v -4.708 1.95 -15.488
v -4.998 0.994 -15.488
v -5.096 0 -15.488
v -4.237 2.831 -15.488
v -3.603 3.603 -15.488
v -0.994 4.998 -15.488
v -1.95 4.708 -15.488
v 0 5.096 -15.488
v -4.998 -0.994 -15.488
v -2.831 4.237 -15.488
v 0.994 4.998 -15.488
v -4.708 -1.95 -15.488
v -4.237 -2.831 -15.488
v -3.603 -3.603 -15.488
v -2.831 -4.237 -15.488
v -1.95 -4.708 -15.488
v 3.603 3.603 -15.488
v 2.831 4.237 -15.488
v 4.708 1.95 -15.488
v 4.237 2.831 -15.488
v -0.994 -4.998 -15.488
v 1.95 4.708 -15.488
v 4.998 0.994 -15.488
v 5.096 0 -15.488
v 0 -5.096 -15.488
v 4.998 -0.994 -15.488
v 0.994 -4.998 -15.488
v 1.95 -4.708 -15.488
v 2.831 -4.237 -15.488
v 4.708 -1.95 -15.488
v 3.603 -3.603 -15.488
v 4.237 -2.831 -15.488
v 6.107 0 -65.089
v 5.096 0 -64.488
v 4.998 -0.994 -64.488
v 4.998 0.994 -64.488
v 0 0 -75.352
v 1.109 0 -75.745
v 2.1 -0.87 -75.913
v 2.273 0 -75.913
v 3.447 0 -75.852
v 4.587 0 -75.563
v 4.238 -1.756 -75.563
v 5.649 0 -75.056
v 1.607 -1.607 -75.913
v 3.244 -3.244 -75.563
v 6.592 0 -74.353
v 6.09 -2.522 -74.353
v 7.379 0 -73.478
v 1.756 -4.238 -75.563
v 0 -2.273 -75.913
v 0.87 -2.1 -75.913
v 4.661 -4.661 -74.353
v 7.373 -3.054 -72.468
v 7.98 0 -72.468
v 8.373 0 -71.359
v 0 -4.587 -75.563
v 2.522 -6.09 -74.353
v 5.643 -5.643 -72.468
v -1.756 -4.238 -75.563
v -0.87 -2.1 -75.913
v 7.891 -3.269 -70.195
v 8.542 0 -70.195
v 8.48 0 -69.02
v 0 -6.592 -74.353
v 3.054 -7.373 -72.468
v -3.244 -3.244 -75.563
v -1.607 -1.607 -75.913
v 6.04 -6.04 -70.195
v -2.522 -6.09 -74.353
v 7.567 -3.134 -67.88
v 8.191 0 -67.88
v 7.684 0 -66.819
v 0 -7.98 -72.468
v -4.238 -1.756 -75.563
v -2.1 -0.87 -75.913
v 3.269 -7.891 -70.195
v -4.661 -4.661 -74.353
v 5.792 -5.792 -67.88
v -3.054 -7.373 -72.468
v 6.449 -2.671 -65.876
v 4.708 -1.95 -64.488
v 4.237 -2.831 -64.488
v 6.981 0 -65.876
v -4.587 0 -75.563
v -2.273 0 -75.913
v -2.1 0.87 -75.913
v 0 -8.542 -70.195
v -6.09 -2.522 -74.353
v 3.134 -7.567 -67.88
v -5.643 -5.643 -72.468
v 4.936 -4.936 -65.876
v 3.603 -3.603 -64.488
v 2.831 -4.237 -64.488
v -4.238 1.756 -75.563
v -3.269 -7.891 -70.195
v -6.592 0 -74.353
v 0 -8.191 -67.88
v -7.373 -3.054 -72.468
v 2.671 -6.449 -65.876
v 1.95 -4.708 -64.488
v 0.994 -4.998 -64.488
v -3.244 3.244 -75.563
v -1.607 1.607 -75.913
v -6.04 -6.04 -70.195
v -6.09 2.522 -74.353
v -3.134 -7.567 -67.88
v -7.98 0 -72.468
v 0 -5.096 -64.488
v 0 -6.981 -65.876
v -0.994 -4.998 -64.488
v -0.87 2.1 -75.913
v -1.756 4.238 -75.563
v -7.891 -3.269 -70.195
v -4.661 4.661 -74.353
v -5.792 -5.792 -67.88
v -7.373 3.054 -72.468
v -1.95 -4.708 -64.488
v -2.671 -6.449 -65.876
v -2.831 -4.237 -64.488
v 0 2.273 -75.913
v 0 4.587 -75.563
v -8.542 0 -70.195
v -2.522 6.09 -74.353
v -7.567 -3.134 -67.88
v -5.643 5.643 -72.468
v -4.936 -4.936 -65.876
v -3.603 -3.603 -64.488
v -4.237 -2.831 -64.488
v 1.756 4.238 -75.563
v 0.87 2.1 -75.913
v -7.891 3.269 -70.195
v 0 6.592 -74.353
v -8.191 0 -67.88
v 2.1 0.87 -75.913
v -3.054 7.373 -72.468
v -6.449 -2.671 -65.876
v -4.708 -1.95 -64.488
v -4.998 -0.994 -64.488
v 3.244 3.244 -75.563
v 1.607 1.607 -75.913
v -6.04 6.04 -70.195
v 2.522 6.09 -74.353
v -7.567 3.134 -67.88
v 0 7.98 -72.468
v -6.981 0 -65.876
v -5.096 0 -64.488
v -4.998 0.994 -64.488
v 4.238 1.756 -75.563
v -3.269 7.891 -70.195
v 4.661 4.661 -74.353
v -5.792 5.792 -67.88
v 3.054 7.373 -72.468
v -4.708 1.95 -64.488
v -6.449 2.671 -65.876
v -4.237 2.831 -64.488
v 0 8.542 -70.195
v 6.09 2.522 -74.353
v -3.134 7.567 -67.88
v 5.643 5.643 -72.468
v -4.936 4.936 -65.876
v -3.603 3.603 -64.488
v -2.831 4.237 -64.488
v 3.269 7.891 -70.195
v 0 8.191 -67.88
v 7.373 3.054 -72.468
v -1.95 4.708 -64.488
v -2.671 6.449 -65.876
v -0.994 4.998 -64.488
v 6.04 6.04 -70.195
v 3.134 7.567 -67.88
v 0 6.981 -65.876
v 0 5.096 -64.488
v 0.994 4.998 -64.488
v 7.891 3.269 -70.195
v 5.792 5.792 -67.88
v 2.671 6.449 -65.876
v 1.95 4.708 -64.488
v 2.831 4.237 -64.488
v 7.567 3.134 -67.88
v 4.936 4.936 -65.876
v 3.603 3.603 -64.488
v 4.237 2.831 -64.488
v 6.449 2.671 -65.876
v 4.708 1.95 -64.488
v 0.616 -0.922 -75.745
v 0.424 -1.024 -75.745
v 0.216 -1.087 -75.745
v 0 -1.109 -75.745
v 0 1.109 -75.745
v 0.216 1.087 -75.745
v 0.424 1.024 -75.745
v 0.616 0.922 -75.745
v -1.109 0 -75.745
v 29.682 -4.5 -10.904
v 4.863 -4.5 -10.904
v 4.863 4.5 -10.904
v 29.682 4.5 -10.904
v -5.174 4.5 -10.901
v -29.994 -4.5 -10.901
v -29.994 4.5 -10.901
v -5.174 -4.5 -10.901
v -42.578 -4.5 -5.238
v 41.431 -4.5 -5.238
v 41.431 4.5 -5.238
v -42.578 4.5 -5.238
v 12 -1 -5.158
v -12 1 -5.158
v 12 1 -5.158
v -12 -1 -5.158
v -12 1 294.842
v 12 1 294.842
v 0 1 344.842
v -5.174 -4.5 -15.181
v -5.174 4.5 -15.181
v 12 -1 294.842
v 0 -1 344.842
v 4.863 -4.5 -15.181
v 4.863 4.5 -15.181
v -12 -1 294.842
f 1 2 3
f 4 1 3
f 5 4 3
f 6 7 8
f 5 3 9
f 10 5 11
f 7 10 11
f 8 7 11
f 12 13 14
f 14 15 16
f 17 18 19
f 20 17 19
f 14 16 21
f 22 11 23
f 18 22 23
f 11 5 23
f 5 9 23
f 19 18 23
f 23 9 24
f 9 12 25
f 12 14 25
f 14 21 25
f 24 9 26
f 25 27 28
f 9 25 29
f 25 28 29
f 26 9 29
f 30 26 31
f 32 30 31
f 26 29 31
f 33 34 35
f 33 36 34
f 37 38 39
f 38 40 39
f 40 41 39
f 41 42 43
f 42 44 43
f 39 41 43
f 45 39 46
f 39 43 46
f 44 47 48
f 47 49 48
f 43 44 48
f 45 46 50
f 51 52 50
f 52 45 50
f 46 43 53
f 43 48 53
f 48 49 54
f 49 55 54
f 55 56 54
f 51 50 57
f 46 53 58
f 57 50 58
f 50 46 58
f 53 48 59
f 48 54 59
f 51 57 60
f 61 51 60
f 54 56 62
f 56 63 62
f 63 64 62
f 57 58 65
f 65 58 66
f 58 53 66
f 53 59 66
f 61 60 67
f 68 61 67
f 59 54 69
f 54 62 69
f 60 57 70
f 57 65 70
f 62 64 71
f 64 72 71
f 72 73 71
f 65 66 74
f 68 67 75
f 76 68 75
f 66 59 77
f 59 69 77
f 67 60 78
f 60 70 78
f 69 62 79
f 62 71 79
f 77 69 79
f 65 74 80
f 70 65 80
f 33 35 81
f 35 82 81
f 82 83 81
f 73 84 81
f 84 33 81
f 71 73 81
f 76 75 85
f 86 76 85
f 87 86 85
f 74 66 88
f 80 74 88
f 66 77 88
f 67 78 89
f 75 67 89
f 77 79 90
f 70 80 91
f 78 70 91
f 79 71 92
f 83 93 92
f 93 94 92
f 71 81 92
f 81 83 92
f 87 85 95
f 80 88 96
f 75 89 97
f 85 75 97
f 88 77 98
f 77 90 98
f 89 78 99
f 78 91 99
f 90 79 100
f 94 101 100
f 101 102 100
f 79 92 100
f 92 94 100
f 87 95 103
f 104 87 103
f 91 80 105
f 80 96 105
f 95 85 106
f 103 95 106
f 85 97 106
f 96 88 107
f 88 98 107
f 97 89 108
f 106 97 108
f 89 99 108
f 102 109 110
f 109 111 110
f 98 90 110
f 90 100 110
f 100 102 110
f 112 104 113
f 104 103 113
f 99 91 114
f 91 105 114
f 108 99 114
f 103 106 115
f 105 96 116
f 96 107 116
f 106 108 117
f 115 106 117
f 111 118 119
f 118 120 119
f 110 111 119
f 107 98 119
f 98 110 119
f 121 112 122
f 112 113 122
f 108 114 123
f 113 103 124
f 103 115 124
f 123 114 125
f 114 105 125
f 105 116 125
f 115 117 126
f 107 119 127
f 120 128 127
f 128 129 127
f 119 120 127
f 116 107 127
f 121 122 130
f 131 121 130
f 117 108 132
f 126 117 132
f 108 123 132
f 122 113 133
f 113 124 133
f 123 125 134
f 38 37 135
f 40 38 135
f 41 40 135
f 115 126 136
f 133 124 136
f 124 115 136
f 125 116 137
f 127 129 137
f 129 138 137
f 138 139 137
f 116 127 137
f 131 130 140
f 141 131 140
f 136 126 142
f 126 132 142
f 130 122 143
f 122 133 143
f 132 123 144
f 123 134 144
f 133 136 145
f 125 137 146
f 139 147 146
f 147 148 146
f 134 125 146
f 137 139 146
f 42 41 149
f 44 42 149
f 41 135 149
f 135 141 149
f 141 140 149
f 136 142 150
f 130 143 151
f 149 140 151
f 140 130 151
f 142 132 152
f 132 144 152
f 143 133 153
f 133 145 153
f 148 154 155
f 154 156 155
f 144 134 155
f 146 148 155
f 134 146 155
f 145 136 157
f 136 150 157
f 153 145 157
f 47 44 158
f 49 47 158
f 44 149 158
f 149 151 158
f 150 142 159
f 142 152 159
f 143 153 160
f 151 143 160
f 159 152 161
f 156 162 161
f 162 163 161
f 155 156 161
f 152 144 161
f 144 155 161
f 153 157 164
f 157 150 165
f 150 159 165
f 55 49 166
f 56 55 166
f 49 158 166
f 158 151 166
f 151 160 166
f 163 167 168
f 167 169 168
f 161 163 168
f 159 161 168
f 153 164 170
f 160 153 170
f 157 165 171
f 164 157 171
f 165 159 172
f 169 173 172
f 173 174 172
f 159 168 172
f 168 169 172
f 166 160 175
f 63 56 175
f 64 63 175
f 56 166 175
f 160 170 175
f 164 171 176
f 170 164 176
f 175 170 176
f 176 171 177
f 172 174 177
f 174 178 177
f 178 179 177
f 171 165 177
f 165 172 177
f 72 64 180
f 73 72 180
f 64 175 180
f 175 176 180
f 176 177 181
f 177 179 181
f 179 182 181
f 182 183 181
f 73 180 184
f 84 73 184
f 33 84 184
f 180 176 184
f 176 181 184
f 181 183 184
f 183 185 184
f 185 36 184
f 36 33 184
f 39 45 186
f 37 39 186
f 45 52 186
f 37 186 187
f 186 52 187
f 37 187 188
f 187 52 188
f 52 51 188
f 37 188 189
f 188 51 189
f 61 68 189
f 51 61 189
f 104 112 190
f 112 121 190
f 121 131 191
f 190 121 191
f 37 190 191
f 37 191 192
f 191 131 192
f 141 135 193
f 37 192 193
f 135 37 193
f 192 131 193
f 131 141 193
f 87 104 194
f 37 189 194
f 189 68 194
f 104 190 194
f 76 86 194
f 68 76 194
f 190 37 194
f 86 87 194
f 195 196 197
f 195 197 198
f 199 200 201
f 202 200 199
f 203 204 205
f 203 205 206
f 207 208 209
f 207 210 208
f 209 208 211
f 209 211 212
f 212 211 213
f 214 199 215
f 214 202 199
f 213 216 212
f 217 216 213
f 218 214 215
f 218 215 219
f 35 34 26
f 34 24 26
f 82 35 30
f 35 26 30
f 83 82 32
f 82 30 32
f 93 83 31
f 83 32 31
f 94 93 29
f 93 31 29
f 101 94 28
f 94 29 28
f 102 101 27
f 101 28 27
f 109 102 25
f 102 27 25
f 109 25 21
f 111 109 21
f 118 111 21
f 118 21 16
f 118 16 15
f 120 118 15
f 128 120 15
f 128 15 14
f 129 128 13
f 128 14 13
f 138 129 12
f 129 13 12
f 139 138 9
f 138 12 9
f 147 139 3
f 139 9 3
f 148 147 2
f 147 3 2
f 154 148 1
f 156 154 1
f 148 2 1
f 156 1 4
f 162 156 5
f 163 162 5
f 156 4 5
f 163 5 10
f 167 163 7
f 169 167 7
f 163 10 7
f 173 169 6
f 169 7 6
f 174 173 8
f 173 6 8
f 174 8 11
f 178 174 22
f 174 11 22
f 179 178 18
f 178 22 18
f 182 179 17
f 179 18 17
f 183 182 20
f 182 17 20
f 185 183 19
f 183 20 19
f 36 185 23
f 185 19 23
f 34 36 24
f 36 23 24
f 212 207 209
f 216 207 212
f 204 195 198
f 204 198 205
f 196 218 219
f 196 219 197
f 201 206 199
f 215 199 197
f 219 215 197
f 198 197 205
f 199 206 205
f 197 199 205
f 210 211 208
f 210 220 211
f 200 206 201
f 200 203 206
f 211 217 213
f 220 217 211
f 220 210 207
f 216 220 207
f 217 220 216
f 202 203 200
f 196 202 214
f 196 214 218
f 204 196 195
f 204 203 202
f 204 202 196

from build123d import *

# Parameters (mm, degrees)
F3_DEPTH      = 4.5
F3_DEPTH_BACK = 4.5
F5_DEPTH      = 1
F5_DEPTH_BACK = 1


with BuildPart() as f1:
    # F0 (on Front) → F1 (revolve)
    with BuildSketch(Plane.XZ):
        with BuildLine():
            Line((0, -64.4876323845), (0, -75.3519144174))
            ThreePointArc((0, -75.3519144174), (7.9800507436, -72.467683128), (5.0958194542, -64.4876323845))
            Line((5.0958194542, -64.4876323845), (0, -64.4876323845))
        make_face()
        with BuildLine():
            Line((0, -64.4876323845), (5.0958194542, -64.4876323845))
            ThreePointArc((5.0958194542, -64.4876323845), (2.5479097271, -63.9197734009), (0, -64.4876323845))
        make_face()
        with BuildLine():
            ThreePointArc((0, -64.4876323845), (2.5479097271, -63.9197734009), (5.0958194542, -64.4876323845))
            Line((5.0958194542, -64.4876323845), (5.0958194542, -15.4876323845))
            Line((5.0958194542, -15.4876323845), (0, -15.4876323845))
            Line((0, -15.4876323845), (0, -64.4876323845))
        make_face()
    revolve(axis=Axis((0, 0, -45.4197734009), (0, 0, -1)))


with BuildPart() as f3:
    # F2 (on Front) → F3 (new body, two sides)
    with BuildSketch(Plane.XZ) as f3_sk:
        Polygon((-5.1739003011, -10.9014402741), (-5.1739003011, -15.1805564427), (4.8633588309, -15.1805564427), (4.8633588309, -10.9038133803), (29.6818474308, -10.9038133803), (41.4314838126, -5.2384072915), (-42.5784168765, -5.2384072915), (-29.9939003011, -10.9014402741), align=None)
    extrude(amount=F3_DEPTH)
    extrude(f3_sk.sketch, amount=-F3_DEPTH_BACK)


with BuildPart() as f5:
    # F4 (on Front) → F5 (new body, two sides)
    with BuildSketch(Plane.XZ) as f5_sk:
        Polygon((-12, -5.1581816573), (0, -5.1581816573), (0, 344.8418183427), (-12, 294.8418183427), align=None)
        Polygon((0, 344.8418183427), (0, -5.1581816573), (12, -5.1581816573), (12, 294.8418183427), align=None)
    extrude(amount=F5_DEPTH)
    extrude(f5_sk.sketch, amount=-F5_DEPTH_BACK)


solid = Compound([f1.part, f3.part, f5.part])
